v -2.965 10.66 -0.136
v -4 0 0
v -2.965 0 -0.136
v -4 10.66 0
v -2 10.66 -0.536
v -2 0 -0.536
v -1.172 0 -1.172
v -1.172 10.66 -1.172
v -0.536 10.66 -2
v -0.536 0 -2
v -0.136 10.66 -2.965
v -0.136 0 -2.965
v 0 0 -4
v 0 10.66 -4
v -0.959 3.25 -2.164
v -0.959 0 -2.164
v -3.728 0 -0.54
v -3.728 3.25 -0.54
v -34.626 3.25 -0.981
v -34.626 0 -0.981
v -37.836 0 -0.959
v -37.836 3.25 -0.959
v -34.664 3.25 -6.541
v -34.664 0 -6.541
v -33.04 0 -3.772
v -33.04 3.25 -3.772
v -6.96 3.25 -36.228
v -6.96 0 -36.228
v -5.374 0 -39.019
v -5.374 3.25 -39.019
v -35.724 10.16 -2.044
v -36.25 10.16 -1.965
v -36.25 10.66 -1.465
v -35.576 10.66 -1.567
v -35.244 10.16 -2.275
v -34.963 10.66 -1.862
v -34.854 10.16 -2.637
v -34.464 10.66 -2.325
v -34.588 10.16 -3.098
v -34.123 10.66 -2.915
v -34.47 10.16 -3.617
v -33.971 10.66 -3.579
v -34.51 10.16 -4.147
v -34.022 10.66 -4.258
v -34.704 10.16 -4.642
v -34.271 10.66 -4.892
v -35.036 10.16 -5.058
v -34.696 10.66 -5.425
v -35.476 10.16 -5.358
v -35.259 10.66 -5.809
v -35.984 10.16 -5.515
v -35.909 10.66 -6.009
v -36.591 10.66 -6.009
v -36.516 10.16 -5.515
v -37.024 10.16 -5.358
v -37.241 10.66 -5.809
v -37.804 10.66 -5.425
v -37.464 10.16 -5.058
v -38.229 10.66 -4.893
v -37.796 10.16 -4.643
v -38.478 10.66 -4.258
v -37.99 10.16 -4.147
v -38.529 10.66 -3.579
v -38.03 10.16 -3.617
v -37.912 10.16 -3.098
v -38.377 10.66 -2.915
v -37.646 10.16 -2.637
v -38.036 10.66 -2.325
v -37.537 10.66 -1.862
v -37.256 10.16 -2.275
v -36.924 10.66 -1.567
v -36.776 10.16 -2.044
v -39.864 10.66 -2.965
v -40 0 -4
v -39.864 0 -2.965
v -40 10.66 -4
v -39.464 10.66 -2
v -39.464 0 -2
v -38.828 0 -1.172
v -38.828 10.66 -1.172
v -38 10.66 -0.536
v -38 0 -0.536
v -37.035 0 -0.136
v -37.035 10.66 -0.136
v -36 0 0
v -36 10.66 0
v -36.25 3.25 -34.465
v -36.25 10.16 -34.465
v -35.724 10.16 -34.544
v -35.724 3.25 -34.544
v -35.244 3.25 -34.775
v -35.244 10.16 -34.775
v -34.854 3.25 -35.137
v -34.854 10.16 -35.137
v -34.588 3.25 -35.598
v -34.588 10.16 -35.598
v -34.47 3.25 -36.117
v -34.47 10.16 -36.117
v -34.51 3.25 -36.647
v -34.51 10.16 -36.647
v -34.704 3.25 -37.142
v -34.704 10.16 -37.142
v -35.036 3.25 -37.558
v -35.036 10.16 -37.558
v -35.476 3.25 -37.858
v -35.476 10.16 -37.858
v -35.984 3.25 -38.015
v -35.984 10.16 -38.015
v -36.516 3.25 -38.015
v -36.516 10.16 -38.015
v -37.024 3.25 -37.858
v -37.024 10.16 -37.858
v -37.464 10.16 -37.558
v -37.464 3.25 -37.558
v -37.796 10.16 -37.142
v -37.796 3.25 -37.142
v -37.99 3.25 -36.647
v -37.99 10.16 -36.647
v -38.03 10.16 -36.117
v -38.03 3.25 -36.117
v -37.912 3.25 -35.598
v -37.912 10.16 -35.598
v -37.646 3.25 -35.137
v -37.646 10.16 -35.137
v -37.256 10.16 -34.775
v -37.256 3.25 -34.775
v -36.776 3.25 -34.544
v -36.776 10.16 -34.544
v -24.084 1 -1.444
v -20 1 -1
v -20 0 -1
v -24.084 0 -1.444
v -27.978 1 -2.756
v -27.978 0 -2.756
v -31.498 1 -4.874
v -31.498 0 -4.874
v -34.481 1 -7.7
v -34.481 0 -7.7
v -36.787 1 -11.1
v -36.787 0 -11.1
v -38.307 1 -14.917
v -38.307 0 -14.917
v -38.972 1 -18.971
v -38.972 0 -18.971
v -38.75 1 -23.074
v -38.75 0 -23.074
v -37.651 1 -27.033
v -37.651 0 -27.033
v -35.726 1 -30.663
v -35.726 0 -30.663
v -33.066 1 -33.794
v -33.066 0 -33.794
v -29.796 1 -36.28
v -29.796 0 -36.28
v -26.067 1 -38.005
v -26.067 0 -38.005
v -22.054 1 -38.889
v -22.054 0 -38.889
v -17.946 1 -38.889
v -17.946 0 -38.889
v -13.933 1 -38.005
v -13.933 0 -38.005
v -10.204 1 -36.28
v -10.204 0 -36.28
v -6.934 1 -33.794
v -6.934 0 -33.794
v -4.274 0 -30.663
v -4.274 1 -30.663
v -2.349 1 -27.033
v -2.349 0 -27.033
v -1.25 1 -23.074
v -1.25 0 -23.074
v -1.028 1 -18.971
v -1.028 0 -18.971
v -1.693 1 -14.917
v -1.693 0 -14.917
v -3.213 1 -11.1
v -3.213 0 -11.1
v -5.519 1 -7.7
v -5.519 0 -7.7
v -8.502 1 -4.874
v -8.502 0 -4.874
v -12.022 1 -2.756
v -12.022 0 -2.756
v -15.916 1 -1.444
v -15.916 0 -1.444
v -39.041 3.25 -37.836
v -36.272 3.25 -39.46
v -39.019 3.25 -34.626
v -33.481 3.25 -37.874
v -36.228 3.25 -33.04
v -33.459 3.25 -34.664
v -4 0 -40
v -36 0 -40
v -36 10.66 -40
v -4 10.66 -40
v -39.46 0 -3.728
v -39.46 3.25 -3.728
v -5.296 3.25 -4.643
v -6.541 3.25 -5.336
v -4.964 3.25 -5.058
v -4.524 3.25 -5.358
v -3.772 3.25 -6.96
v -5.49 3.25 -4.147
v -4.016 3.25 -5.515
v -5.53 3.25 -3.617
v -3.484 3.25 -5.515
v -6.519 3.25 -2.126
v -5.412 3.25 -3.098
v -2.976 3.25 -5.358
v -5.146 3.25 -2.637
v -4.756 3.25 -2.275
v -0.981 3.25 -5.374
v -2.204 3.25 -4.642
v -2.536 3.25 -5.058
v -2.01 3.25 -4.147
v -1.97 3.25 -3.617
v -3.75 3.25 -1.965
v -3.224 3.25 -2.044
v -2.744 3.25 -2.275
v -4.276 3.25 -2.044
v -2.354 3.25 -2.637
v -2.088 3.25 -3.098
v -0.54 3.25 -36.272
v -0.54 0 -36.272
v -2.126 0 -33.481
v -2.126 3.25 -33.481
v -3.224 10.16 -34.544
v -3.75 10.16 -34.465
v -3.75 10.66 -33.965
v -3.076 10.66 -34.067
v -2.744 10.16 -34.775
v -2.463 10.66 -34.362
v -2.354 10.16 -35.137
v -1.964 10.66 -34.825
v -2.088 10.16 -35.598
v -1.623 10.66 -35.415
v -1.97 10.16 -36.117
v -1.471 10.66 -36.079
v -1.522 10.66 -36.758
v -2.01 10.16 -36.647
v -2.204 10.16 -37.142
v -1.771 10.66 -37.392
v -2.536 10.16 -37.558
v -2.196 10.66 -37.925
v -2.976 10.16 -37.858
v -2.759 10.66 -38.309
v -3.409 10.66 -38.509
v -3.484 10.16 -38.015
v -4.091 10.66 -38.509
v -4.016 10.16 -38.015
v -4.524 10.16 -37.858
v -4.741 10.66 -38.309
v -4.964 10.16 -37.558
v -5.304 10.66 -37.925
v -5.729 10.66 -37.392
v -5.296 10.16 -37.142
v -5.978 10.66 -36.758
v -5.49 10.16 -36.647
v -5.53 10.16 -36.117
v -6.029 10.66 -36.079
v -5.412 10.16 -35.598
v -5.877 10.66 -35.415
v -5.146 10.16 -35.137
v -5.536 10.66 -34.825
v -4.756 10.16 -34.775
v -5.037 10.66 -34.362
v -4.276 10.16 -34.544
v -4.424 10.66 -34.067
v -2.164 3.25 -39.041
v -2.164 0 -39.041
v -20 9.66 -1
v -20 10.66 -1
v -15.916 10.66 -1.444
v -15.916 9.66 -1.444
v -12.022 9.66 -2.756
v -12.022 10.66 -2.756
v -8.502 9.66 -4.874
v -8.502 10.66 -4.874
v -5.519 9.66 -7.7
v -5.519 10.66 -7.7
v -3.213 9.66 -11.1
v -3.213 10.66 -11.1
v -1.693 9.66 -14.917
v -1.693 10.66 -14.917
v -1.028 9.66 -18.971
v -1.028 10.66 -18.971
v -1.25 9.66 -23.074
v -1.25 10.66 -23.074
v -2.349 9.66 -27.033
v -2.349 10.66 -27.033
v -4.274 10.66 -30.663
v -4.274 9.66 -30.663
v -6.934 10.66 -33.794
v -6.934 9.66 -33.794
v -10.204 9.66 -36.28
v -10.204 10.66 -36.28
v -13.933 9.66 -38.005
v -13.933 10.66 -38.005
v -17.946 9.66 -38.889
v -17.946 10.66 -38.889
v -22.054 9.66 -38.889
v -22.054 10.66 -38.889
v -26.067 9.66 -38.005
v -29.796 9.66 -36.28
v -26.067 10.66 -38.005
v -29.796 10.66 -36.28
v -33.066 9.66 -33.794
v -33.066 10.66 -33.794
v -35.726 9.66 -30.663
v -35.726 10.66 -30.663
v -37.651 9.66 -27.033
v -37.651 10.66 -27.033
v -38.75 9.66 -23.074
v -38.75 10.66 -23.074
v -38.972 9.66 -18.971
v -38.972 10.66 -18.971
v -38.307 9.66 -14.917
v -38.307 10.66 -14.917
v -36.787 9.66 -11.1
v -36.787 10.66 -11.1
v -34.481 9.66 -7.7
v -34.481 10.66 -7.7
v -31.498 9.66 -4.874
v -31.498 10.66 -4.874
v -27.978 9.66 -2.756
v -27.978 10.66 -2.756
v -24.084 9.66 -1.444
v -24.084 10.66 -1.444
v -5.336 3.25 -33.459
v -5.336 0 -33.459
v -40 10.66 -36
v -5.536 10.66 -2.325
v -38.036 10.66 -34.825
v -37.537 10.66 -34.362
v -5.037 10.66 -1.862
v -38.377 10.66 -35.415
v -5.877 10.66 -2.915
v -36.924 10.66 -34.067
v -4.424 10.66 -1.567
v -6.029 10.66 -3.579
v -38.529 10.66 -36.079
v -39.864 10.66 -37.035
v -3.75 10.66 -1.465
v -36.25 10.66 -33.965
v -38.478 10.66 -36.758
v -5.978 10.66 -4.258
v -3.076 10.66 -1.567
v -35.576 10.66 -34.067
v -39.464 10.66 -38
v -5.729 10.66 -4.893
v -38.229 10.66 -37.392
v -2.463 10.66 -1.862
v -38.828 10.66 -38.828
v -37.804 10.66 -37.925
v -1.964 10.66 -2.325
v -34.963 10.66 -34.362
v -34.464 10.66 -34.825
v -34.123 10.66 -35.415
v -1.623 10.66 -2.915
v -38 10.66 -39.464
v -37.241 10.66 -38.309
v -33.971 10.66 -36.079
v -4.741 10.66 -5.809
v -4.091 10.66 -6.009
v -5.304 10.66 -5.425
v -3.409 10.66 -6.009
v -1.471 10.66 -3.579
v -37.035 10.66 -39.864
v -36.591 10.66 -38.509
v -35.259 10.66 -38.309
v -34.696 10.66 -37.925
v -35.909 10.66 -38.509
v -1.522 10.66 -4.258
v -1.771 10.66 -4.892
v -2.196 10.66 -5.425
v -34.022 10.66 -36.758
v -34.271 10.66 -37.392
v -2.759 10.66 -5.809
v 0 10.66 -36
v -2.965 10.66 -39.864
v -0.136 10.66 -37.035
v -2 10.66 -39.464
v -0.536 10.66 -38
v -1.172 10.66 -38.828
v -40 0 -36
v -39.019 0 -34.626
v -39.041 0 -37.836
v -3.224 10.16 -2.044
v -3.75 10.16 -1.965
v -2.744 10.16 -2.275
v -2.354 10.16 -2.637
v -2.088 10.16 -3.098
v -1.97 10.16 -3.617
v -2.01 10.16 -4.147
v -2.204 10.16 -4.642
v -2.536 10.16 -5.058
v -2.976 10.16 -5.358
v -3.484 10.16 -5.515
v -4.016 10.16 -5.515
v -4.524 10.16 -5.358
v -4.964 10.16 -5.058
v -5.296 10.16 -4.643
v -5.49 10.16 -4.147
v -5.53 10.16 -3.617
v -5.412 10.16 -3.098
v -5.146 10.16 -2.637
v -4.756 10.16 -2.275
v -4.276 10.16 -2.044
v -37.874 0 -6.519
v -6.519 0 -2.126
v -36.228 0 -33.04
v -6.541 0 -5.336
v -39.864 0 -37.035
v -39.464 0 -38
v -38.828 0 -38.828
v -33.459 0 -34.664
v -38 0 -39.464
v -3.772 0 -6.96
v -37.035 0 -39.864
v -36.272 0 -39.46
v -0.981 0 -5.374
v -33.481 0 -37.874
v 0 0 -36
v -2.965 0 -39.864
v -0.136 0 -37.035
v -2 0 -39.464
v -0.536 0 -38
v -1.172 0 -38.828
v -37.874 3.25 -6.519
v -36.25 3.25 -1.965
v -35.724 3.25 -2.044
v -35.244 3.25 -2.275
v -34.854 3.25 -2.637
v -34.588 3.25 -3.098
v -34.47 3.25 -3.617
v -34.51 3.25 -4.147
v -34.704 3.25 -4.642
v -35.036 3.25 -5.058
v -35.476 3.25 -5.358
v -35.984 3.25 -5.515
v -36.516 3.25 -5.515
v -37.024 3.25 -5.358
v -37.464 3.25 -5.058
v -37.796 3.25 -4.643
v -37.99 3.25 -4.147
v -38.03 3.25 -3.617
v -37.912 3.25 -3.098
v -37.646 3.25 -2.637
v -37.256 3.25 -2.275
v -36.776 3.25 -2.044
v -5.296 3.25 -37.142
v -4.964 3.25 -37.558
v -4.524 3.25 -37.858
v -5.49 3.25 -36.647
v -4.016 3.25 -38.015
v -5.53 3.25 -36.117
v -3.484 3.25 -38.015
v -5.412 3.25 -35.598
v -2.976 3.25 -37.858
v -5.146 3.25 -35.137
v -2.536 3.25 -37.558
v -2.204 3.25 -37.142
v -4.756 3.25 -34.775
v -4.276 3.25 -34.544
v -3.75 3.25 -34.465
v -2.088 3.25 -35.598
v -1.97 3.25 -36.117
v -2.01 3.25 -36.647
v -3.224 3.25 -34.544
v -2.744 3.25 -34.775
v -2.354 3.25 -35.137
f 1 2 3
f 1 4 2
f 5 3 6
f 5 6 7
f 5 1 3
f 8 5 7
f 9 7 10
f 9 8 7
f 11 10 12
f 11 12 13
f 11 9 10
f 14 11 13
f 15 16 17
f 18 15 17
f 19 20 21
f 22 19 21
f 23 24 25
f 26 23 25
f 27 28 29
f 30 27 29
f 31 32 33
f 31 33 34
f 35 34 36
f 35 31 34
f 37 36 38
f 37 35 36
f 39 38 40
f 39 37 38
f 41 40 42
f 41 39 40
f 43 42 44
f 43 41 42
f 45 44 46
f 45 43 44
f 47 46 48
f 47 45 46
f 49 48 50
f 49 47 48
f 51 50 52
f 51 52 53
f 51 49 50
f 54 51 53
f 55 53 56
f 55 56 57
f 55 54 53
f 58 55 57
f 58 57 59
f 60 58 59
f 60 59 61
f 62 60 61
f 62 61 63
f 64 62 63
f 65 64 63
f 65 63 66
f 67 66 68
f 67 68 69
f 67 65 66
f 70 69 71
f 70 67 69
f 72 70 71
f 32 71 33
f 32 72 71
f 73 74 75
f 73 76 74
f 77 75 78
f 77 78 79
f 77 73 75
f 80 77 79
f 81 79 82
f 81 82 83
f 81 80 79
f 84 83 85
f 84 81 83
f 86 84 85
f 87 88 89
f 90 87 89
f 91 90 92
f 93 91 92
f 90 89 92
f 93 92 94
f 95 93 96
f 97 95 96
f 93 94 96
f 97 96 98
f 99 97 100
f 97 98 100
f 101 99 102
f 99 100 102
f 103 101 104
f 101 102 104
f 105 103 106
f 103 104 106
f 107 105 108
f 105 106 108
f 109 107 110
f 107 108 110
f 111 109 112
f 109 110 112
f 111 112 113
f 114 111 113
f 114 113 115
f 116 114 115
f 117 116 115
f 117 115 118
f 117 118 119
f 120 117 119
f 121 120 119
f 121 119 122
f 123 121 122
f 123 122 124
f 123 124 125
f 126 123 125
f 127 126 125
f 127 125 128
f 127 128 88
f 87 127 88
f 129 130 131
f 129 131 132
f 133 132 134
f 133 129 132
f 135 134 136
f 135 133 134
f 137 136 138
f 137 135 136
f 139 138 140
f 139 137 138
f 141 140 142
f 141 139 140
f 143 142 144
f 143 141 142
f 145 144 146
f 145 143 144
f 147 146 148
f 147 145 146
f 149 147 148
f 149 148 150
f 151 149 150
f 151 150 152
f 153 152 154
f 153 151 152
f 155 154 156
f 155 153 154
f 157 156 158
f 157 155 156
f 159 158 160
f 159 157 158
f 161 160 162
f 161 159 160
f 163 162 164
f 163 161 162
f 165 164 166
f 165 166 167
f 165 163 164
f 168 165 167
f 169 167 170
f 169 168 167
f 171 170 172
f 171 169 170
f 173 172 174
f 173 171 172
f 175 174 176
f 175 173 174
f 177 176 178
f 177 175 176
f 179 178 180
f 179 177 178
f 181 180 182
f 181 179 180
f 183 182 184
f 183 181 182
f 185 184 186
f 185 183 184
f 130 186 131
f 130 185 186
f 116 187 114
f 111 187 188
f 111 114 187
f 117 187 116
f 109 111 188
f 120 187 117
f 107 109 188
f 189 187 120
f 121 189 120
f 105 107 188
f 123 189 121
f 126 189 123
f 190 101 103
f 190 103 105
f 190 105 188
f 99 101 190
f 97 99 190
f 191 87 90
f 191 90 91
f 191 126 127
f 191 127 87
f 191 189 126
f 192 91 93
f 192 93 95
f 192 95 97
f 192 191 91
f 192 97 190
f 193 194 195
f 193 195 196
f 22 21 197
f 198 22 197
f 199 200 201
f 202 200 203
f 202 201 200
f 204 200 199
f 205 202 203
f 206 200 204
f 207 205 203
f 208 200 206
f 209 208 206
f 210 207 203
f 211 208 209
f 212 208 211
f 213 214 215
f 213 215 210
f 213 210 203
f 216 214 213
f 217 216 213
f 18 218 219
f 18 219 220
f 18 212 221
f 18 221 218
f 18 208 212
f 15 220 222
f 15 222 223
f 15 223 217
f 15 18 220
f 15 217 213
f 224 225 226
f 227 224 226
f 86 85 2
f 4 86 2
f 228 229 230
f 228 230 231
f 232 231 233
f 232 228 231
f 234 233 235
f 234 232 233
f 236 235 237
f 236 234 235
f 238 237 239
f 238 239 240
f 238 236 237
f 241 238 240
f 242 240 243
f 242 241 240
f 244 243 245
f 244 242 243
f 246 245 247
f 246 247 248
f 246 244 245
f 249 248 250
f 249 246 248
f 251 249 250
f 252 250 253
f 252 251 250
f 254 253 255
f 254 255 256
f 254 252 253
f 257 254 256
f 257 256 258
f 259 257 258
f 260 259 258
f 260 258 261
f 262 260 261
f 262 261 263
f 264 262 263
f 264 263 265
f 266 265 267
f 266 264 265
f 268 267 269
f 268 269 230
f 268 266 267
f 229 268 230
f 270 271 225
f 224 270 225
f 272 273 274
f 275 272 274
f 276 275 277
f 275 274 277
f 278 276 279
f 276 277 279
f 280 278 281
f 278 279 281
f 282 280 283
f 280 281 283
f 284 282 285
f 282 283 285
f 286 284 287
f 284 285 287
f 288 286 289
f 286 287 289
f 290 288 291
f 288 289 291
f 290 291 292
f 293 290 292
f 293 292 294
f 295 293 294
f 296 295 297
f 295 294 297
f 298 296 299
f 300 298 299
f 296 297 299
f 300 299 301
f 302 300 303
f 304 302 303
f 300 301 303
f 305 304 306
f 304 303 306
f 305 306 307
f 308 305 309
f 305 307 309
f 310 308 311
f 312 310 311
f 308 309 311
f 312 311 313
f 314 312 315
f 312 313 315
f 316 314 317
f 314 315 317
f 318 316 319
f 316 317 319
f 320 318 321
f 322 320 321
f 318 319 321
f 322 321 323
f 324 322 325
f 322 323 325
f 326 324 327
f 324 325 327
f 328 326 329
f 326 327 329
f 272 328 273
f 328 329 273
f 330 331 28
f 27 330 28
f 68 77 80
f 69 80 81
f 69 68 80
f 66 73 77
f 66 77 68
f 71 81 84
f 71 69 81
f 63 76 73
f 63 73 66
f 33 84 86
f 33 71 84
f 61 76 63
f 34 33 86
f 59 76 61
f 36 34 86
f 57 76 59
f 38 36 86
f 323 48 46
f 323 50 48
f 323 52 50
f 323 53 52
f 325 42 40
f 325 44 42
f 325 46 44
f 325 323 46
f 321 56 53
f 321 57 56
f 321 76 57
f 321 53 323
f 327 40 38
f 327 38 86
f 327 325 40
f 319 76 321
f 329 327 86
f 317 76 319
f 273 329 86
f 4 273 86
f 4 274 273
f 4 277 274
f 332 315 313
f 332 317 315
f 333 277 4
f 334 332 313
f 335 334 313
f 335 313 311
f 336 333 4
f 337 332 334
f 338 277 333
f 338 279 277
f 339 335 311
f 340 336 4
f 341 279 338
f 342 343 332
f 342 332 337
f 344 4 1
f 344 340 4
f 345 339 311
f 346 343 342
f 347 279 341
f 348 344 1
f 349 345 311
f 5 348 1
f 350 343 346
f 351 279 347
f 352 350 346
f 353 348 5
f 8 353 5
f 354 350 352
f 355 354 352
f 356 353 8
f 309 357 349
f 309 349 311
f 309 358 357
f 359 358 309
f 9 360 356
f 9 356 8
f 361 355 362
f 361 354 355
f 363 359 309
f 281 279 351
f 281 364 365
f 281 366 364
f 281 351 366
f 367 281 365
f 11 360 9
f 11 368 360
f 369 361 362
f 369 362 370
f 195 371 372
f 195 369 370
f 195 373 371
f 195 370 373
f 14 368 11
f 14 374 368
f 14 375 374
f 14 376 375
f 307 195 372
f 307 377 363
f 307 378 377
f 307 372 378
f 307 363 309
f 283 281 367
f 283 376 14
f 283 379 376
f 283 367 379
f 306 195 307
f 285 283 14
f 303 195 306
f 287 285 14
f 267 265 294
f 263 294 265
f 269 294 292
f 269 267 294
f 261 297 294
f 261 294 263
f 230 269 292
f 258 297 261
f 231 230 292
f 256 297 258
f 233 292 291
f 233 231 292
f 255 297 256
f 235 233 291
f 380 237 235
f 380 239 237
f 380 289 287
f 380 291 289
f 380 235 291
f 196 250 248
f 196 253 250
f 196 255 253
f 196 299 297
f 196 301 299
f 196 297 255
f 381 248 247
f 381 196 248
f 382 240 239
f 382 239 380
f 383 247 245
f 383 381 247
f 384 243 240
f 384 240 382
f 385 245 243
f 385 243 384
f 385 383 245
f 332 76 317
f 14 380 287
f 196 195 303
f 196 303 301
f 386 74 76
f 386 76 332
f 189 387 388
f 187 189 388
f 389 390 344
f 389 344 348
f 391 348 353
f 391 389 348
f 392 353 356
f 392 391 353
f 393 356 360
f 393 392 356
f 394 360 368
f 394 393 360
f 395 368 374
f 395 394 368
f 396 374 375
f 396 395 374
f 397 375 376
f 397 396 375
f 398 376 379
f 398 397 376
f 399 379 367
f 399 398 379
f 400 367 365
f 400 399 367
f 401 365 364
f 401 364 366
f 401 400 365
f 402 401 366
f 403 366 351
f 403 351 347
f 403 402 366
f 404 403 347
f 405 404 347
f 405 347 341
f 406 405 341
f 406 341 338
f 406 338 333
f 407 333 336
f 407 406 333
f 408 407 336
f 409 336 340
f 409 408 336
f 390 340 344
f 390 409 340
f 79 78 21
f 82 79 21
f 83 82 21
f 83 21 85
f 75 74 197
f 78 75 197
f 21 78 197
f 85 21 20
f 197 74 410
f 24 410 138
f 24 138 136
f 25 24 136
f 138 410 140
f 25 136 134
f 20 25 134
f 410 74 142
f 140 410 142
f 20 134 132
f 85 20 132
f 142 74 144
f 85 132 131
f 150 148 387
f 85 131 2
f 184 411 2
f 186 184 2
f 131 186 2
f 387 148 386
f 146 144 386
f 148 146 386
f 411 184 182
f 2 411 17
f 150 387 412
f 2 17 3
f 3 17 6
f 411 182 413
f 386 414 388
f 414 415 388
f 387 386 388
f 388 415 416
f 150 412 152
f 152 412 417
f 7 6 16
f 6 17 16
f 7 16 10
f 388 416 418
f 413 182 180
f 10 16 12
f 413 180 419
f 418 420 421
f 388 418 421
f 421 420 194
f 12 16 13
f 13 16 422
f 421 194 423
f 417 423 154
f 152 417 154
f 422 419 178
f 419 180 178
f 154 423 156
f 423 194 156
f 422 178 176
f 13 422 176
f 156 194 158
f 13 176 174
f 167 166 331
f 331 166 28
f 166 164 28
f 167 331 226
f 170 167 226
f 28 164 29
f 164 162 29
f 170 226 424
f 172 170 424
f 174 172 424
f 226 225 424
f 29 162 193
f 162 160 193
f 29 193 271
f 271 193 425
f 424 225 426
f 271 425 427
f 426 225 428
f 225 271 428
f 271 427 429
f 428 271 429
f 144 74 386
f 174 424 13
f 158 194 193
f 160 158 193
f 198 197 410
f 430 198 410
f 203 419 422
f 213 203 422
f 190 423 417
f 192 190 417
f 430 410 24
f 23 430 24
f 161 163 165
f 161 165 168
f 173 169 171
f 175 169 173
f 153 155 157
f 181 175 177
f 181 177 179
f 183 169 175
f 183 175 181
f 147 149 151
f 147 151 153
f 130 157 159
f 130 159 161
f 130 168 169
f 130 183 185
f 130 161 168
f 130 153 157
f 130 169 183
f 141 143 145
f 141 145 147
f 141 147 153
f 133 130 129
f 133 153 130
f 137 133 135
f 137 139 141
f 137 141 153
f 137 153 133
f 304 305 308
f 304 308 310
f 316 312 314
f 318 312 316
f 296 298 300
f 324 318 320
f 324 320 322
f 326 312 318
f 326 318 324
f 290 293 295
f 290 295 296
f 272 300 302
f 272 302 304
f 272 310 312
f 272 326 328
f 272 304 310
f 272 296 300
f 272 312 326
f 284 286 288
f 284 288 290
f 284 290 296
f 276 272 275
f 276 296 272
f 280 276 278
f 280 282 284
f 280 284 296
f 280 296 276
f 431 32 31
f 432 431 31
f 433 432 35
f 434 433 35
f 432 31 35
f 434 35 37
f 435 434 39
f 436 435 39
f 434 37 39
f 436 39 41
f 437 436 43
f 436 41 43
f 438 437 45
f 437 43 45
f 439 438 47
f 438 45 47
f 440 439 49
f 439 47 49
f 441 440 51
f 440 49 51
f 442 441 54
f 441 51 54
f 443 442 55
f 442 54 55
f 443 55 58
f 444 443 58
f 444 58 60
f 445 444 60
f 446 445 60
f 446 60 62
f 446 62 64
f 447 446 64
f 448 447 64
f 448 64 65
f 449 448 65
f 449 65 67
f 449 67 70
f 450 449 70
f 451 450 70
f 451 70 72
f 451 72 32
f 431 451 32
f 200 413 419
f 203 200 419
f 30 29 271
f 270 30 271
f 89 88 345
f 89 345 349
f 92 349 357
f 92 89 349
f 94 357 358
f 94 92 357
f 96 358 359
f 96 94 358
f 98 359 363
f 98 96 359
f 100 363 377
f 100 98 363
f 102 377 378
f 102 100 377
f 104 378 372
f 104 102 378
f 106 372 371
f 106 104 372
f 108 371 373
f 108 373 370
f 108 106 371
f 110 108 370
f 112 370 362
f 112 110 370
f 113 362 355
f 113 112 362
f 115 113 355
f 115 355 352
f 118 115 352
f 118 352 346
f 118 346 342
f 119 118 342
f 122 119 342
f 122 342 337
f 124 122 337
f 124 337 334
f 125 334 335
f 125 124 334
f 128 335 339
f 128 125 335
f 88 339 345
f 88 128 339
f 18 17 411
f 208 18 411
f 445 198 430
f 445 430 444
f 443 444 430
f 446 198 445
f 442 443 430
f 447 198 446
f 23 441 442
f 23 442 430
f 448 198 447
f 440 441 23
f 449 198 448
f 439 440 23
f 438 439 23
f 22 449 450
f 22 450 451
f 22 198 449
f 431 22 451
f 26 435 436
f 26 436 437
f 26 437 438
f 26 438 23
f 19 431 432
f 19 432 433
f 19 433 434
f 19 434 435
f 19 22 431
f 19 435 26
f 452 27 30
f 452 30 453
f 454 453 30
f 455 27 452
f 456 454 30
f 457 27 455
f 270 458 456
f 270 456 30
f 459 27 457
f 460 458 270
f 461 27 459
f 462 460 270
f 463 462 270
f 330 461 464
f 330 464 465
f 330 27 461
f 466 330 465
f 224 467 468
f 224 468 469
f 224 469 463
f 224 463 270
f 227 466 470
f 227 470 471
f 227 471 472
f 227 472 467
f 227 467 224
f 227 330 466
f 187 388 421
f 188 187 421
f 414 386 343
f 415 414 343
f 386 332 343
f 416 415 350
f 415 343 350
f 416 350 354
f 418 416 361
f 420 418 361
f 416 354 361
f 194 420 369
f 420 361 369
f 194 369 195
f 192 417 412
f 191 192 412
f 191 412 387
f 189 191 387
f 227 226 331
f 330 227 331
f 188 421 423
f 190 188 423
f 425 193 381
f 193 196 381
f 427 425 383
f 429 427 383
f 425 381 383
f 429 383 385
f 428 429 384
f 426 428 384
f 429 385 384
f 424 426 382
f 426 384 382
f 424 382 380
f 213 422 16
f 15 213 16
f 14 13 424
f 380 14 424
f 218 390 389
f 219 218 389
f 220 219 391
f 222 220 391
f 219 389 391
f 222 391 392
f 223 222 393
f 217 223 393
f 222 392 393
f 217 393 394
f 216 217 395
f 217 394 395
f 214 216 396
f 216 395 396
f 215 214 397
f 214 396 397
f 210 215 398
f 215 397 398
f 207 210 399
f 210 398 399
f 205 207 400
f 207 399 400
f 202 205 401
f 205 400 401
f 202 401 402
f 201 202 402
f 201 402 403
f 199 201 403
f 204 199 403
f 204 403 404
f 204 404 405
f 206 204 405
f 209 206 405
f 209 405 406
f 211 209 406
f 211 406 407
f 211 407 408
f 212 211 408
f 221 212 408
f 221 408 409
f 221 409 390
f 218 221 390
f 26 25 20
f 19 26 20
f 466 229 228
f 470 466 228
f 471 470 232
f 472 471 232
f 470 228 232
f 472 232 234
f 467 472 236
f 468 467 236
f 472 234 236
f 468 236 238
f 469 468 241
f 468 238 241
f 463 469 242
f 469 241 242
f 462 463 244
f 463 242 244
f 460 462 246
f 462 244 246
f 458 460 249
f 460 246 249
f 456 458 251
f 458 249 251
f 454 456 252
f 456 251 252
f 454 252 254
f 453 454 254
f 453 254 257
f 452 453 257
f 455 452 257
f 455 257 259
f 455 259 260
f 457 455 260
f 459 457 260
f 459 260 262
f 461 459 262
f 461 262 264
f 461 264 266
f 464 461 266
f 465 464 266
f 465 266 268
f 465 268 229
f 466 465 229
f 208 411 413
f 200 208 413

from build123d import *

# Parameters (mm, degrees)
SKETCH1_W           = 40
SKETCH1_H           = 40
BOSS_EXTRUDE1_DEPTH = 10.66
SKETCH2_R           = 19
CUT_EXTRUDE1_DEPTH  = 1
CUT_EXTRUDE2_START  = -1
SKETCH3_R           = 19
CUT_EXTRUDE2_DEPTH  = 1
SKETCH4_R           = 1.785
CUT_EXTRUDE3_DEPTH  = 58.564186783
CUT_EXTRUDE4_DEPTH  = 3.25
CHAMFER1_SIZE       = 0.5
FILLET1_R           = 4


with BuildPart() as part:
    # Sketch1 → Boss-Extrude1 (new body)
    with BuildSketch(Plane(origin=(0, 0, 0), x_dir=(1, 0, 0), z_dir=(0, 1, 0))):
        with Locations((-20, 20)):
            Rectangle(SKETCH1_W, SKETCH1_H)
    extrude(amount=BOSS_EXTRUDE1_DEPTH)

    # Sketch2 → Cut-Extrude1 (cut)
    with BuildSketch(Plane(origin=(0, 10.66, 0), x_dir=(1, 0, 0), z_dir=(0, 1, 0))):
        with Locations(Location((-20, 20, 0), (0, 0, 270))):
            Circle(SKETCH2_R)
    extrude(amount=-CUT_EXTRUDE1_DEPTH, mode=Mode.SUBTRACT)

    # Sketch3 → Cut-Extrude2 (cut)
    with BuildSketch(Plane.XZ.offset(CUT_EXTRUDE2_START)):
        with Locations(Location((-20, -20, 0), (0, 0, 90))):
            Circle(SKETCH3_R)
    extrude(amount=CUT_EXTRUDE2_DEPTH, mode=Mode.SUBTRACT)

    # Sketch4 → Cut-Extrude3 (cut, through all)
    with BuildSketch(Plane(origin=(0, 10.66, 0), x_dir=(1, 0, 0), z_dir=(0, 1, 0))):
        with Locations(Location((-36.25, 36.25, 0), (0, 0, 270))):
            Circle(SKETCH4_R)
        with Locations(Location((-3.75, 36.25, 0), (0, 0, 270))):
            Circle(SKETCH4_R)
        with Locations(Location((-3.75, 3.75, 0), (0, 0, 270))):
            Circle(SKETCH4_R)
        with Locations(Location((-36.25, 3.75, 0), (0, 0, 270))):
            Circle(SKETCH4_R)
    extrude(amount=-CUT_EXTRUDE3_DEPTH, mode=Mode.SUBTRACT)

    # Sketch5 → Cut-Extrude4 (cut)
    with BuildSketch(Plane.XZ):
        Polygon((-39.019012185, -34.626083484), (-39.040859049, -37.836076638), (-36.271846864, -39.459993154), (-33.480987815, -37.873916516), (-33.459140951, -34.663923362), (-36.228153136, -33.040006846), align=None)
        Polygon((-34.626083484, -0.980987815), (-37.836076638, -0.959140951), (-39.459993154, -3.728153136), (-37.873916516, -6.519012185), (-34.663923362, -6.540859049), (-33.040006846, -3.771846864), align=None)
        Polygon((-5.373916516, -39.019012185), (-2.163923362, -39.040859049), (-0.540006846, -36.271846864), (-2.126083484, -33.480987815), (-5.336076638, -33.459140951), (-6.959993154, -36.228153136), align=None)
        Polygon((-0.980987815, -5.373916516), (-0.959140951, -2.163923362), (-3.728153136, -0.540006846), (-6.519012185, -2.126083484), (-6.540859049, -5.336076638), (-3.771846864, -6.959993154), align=None)
    extrude(amount=-CUT_EXTRUDE4_DEPTH, mode=Mode.SUBTRACT)

    # Chamfer1
    chamfer1_edges = [part.edges().sort_by_distance(p)[0] for p in [
        (-36.25, 10.66, -5.535),
        (-3.75, 10.66, -5.535),
        (-3.75, 10.66, -38.035),
        (-36.25, 10.66, -38.035),
    ]]
    chamfer(chamfer1_edges, length=CHAMFER1_SIZE)

    # Fillet1
    fillet1_edges = [part.edges().sort_by_distance(p)[0] for p in [
        (0, 5.33, 0),
        (-40, 5.33, 0),
        (-40, 5.33, -40),
        (0, 5.33, -40),
    ]]
    fillet(fillet1_edges, radius=FILLET1_R)


solid = part.part
